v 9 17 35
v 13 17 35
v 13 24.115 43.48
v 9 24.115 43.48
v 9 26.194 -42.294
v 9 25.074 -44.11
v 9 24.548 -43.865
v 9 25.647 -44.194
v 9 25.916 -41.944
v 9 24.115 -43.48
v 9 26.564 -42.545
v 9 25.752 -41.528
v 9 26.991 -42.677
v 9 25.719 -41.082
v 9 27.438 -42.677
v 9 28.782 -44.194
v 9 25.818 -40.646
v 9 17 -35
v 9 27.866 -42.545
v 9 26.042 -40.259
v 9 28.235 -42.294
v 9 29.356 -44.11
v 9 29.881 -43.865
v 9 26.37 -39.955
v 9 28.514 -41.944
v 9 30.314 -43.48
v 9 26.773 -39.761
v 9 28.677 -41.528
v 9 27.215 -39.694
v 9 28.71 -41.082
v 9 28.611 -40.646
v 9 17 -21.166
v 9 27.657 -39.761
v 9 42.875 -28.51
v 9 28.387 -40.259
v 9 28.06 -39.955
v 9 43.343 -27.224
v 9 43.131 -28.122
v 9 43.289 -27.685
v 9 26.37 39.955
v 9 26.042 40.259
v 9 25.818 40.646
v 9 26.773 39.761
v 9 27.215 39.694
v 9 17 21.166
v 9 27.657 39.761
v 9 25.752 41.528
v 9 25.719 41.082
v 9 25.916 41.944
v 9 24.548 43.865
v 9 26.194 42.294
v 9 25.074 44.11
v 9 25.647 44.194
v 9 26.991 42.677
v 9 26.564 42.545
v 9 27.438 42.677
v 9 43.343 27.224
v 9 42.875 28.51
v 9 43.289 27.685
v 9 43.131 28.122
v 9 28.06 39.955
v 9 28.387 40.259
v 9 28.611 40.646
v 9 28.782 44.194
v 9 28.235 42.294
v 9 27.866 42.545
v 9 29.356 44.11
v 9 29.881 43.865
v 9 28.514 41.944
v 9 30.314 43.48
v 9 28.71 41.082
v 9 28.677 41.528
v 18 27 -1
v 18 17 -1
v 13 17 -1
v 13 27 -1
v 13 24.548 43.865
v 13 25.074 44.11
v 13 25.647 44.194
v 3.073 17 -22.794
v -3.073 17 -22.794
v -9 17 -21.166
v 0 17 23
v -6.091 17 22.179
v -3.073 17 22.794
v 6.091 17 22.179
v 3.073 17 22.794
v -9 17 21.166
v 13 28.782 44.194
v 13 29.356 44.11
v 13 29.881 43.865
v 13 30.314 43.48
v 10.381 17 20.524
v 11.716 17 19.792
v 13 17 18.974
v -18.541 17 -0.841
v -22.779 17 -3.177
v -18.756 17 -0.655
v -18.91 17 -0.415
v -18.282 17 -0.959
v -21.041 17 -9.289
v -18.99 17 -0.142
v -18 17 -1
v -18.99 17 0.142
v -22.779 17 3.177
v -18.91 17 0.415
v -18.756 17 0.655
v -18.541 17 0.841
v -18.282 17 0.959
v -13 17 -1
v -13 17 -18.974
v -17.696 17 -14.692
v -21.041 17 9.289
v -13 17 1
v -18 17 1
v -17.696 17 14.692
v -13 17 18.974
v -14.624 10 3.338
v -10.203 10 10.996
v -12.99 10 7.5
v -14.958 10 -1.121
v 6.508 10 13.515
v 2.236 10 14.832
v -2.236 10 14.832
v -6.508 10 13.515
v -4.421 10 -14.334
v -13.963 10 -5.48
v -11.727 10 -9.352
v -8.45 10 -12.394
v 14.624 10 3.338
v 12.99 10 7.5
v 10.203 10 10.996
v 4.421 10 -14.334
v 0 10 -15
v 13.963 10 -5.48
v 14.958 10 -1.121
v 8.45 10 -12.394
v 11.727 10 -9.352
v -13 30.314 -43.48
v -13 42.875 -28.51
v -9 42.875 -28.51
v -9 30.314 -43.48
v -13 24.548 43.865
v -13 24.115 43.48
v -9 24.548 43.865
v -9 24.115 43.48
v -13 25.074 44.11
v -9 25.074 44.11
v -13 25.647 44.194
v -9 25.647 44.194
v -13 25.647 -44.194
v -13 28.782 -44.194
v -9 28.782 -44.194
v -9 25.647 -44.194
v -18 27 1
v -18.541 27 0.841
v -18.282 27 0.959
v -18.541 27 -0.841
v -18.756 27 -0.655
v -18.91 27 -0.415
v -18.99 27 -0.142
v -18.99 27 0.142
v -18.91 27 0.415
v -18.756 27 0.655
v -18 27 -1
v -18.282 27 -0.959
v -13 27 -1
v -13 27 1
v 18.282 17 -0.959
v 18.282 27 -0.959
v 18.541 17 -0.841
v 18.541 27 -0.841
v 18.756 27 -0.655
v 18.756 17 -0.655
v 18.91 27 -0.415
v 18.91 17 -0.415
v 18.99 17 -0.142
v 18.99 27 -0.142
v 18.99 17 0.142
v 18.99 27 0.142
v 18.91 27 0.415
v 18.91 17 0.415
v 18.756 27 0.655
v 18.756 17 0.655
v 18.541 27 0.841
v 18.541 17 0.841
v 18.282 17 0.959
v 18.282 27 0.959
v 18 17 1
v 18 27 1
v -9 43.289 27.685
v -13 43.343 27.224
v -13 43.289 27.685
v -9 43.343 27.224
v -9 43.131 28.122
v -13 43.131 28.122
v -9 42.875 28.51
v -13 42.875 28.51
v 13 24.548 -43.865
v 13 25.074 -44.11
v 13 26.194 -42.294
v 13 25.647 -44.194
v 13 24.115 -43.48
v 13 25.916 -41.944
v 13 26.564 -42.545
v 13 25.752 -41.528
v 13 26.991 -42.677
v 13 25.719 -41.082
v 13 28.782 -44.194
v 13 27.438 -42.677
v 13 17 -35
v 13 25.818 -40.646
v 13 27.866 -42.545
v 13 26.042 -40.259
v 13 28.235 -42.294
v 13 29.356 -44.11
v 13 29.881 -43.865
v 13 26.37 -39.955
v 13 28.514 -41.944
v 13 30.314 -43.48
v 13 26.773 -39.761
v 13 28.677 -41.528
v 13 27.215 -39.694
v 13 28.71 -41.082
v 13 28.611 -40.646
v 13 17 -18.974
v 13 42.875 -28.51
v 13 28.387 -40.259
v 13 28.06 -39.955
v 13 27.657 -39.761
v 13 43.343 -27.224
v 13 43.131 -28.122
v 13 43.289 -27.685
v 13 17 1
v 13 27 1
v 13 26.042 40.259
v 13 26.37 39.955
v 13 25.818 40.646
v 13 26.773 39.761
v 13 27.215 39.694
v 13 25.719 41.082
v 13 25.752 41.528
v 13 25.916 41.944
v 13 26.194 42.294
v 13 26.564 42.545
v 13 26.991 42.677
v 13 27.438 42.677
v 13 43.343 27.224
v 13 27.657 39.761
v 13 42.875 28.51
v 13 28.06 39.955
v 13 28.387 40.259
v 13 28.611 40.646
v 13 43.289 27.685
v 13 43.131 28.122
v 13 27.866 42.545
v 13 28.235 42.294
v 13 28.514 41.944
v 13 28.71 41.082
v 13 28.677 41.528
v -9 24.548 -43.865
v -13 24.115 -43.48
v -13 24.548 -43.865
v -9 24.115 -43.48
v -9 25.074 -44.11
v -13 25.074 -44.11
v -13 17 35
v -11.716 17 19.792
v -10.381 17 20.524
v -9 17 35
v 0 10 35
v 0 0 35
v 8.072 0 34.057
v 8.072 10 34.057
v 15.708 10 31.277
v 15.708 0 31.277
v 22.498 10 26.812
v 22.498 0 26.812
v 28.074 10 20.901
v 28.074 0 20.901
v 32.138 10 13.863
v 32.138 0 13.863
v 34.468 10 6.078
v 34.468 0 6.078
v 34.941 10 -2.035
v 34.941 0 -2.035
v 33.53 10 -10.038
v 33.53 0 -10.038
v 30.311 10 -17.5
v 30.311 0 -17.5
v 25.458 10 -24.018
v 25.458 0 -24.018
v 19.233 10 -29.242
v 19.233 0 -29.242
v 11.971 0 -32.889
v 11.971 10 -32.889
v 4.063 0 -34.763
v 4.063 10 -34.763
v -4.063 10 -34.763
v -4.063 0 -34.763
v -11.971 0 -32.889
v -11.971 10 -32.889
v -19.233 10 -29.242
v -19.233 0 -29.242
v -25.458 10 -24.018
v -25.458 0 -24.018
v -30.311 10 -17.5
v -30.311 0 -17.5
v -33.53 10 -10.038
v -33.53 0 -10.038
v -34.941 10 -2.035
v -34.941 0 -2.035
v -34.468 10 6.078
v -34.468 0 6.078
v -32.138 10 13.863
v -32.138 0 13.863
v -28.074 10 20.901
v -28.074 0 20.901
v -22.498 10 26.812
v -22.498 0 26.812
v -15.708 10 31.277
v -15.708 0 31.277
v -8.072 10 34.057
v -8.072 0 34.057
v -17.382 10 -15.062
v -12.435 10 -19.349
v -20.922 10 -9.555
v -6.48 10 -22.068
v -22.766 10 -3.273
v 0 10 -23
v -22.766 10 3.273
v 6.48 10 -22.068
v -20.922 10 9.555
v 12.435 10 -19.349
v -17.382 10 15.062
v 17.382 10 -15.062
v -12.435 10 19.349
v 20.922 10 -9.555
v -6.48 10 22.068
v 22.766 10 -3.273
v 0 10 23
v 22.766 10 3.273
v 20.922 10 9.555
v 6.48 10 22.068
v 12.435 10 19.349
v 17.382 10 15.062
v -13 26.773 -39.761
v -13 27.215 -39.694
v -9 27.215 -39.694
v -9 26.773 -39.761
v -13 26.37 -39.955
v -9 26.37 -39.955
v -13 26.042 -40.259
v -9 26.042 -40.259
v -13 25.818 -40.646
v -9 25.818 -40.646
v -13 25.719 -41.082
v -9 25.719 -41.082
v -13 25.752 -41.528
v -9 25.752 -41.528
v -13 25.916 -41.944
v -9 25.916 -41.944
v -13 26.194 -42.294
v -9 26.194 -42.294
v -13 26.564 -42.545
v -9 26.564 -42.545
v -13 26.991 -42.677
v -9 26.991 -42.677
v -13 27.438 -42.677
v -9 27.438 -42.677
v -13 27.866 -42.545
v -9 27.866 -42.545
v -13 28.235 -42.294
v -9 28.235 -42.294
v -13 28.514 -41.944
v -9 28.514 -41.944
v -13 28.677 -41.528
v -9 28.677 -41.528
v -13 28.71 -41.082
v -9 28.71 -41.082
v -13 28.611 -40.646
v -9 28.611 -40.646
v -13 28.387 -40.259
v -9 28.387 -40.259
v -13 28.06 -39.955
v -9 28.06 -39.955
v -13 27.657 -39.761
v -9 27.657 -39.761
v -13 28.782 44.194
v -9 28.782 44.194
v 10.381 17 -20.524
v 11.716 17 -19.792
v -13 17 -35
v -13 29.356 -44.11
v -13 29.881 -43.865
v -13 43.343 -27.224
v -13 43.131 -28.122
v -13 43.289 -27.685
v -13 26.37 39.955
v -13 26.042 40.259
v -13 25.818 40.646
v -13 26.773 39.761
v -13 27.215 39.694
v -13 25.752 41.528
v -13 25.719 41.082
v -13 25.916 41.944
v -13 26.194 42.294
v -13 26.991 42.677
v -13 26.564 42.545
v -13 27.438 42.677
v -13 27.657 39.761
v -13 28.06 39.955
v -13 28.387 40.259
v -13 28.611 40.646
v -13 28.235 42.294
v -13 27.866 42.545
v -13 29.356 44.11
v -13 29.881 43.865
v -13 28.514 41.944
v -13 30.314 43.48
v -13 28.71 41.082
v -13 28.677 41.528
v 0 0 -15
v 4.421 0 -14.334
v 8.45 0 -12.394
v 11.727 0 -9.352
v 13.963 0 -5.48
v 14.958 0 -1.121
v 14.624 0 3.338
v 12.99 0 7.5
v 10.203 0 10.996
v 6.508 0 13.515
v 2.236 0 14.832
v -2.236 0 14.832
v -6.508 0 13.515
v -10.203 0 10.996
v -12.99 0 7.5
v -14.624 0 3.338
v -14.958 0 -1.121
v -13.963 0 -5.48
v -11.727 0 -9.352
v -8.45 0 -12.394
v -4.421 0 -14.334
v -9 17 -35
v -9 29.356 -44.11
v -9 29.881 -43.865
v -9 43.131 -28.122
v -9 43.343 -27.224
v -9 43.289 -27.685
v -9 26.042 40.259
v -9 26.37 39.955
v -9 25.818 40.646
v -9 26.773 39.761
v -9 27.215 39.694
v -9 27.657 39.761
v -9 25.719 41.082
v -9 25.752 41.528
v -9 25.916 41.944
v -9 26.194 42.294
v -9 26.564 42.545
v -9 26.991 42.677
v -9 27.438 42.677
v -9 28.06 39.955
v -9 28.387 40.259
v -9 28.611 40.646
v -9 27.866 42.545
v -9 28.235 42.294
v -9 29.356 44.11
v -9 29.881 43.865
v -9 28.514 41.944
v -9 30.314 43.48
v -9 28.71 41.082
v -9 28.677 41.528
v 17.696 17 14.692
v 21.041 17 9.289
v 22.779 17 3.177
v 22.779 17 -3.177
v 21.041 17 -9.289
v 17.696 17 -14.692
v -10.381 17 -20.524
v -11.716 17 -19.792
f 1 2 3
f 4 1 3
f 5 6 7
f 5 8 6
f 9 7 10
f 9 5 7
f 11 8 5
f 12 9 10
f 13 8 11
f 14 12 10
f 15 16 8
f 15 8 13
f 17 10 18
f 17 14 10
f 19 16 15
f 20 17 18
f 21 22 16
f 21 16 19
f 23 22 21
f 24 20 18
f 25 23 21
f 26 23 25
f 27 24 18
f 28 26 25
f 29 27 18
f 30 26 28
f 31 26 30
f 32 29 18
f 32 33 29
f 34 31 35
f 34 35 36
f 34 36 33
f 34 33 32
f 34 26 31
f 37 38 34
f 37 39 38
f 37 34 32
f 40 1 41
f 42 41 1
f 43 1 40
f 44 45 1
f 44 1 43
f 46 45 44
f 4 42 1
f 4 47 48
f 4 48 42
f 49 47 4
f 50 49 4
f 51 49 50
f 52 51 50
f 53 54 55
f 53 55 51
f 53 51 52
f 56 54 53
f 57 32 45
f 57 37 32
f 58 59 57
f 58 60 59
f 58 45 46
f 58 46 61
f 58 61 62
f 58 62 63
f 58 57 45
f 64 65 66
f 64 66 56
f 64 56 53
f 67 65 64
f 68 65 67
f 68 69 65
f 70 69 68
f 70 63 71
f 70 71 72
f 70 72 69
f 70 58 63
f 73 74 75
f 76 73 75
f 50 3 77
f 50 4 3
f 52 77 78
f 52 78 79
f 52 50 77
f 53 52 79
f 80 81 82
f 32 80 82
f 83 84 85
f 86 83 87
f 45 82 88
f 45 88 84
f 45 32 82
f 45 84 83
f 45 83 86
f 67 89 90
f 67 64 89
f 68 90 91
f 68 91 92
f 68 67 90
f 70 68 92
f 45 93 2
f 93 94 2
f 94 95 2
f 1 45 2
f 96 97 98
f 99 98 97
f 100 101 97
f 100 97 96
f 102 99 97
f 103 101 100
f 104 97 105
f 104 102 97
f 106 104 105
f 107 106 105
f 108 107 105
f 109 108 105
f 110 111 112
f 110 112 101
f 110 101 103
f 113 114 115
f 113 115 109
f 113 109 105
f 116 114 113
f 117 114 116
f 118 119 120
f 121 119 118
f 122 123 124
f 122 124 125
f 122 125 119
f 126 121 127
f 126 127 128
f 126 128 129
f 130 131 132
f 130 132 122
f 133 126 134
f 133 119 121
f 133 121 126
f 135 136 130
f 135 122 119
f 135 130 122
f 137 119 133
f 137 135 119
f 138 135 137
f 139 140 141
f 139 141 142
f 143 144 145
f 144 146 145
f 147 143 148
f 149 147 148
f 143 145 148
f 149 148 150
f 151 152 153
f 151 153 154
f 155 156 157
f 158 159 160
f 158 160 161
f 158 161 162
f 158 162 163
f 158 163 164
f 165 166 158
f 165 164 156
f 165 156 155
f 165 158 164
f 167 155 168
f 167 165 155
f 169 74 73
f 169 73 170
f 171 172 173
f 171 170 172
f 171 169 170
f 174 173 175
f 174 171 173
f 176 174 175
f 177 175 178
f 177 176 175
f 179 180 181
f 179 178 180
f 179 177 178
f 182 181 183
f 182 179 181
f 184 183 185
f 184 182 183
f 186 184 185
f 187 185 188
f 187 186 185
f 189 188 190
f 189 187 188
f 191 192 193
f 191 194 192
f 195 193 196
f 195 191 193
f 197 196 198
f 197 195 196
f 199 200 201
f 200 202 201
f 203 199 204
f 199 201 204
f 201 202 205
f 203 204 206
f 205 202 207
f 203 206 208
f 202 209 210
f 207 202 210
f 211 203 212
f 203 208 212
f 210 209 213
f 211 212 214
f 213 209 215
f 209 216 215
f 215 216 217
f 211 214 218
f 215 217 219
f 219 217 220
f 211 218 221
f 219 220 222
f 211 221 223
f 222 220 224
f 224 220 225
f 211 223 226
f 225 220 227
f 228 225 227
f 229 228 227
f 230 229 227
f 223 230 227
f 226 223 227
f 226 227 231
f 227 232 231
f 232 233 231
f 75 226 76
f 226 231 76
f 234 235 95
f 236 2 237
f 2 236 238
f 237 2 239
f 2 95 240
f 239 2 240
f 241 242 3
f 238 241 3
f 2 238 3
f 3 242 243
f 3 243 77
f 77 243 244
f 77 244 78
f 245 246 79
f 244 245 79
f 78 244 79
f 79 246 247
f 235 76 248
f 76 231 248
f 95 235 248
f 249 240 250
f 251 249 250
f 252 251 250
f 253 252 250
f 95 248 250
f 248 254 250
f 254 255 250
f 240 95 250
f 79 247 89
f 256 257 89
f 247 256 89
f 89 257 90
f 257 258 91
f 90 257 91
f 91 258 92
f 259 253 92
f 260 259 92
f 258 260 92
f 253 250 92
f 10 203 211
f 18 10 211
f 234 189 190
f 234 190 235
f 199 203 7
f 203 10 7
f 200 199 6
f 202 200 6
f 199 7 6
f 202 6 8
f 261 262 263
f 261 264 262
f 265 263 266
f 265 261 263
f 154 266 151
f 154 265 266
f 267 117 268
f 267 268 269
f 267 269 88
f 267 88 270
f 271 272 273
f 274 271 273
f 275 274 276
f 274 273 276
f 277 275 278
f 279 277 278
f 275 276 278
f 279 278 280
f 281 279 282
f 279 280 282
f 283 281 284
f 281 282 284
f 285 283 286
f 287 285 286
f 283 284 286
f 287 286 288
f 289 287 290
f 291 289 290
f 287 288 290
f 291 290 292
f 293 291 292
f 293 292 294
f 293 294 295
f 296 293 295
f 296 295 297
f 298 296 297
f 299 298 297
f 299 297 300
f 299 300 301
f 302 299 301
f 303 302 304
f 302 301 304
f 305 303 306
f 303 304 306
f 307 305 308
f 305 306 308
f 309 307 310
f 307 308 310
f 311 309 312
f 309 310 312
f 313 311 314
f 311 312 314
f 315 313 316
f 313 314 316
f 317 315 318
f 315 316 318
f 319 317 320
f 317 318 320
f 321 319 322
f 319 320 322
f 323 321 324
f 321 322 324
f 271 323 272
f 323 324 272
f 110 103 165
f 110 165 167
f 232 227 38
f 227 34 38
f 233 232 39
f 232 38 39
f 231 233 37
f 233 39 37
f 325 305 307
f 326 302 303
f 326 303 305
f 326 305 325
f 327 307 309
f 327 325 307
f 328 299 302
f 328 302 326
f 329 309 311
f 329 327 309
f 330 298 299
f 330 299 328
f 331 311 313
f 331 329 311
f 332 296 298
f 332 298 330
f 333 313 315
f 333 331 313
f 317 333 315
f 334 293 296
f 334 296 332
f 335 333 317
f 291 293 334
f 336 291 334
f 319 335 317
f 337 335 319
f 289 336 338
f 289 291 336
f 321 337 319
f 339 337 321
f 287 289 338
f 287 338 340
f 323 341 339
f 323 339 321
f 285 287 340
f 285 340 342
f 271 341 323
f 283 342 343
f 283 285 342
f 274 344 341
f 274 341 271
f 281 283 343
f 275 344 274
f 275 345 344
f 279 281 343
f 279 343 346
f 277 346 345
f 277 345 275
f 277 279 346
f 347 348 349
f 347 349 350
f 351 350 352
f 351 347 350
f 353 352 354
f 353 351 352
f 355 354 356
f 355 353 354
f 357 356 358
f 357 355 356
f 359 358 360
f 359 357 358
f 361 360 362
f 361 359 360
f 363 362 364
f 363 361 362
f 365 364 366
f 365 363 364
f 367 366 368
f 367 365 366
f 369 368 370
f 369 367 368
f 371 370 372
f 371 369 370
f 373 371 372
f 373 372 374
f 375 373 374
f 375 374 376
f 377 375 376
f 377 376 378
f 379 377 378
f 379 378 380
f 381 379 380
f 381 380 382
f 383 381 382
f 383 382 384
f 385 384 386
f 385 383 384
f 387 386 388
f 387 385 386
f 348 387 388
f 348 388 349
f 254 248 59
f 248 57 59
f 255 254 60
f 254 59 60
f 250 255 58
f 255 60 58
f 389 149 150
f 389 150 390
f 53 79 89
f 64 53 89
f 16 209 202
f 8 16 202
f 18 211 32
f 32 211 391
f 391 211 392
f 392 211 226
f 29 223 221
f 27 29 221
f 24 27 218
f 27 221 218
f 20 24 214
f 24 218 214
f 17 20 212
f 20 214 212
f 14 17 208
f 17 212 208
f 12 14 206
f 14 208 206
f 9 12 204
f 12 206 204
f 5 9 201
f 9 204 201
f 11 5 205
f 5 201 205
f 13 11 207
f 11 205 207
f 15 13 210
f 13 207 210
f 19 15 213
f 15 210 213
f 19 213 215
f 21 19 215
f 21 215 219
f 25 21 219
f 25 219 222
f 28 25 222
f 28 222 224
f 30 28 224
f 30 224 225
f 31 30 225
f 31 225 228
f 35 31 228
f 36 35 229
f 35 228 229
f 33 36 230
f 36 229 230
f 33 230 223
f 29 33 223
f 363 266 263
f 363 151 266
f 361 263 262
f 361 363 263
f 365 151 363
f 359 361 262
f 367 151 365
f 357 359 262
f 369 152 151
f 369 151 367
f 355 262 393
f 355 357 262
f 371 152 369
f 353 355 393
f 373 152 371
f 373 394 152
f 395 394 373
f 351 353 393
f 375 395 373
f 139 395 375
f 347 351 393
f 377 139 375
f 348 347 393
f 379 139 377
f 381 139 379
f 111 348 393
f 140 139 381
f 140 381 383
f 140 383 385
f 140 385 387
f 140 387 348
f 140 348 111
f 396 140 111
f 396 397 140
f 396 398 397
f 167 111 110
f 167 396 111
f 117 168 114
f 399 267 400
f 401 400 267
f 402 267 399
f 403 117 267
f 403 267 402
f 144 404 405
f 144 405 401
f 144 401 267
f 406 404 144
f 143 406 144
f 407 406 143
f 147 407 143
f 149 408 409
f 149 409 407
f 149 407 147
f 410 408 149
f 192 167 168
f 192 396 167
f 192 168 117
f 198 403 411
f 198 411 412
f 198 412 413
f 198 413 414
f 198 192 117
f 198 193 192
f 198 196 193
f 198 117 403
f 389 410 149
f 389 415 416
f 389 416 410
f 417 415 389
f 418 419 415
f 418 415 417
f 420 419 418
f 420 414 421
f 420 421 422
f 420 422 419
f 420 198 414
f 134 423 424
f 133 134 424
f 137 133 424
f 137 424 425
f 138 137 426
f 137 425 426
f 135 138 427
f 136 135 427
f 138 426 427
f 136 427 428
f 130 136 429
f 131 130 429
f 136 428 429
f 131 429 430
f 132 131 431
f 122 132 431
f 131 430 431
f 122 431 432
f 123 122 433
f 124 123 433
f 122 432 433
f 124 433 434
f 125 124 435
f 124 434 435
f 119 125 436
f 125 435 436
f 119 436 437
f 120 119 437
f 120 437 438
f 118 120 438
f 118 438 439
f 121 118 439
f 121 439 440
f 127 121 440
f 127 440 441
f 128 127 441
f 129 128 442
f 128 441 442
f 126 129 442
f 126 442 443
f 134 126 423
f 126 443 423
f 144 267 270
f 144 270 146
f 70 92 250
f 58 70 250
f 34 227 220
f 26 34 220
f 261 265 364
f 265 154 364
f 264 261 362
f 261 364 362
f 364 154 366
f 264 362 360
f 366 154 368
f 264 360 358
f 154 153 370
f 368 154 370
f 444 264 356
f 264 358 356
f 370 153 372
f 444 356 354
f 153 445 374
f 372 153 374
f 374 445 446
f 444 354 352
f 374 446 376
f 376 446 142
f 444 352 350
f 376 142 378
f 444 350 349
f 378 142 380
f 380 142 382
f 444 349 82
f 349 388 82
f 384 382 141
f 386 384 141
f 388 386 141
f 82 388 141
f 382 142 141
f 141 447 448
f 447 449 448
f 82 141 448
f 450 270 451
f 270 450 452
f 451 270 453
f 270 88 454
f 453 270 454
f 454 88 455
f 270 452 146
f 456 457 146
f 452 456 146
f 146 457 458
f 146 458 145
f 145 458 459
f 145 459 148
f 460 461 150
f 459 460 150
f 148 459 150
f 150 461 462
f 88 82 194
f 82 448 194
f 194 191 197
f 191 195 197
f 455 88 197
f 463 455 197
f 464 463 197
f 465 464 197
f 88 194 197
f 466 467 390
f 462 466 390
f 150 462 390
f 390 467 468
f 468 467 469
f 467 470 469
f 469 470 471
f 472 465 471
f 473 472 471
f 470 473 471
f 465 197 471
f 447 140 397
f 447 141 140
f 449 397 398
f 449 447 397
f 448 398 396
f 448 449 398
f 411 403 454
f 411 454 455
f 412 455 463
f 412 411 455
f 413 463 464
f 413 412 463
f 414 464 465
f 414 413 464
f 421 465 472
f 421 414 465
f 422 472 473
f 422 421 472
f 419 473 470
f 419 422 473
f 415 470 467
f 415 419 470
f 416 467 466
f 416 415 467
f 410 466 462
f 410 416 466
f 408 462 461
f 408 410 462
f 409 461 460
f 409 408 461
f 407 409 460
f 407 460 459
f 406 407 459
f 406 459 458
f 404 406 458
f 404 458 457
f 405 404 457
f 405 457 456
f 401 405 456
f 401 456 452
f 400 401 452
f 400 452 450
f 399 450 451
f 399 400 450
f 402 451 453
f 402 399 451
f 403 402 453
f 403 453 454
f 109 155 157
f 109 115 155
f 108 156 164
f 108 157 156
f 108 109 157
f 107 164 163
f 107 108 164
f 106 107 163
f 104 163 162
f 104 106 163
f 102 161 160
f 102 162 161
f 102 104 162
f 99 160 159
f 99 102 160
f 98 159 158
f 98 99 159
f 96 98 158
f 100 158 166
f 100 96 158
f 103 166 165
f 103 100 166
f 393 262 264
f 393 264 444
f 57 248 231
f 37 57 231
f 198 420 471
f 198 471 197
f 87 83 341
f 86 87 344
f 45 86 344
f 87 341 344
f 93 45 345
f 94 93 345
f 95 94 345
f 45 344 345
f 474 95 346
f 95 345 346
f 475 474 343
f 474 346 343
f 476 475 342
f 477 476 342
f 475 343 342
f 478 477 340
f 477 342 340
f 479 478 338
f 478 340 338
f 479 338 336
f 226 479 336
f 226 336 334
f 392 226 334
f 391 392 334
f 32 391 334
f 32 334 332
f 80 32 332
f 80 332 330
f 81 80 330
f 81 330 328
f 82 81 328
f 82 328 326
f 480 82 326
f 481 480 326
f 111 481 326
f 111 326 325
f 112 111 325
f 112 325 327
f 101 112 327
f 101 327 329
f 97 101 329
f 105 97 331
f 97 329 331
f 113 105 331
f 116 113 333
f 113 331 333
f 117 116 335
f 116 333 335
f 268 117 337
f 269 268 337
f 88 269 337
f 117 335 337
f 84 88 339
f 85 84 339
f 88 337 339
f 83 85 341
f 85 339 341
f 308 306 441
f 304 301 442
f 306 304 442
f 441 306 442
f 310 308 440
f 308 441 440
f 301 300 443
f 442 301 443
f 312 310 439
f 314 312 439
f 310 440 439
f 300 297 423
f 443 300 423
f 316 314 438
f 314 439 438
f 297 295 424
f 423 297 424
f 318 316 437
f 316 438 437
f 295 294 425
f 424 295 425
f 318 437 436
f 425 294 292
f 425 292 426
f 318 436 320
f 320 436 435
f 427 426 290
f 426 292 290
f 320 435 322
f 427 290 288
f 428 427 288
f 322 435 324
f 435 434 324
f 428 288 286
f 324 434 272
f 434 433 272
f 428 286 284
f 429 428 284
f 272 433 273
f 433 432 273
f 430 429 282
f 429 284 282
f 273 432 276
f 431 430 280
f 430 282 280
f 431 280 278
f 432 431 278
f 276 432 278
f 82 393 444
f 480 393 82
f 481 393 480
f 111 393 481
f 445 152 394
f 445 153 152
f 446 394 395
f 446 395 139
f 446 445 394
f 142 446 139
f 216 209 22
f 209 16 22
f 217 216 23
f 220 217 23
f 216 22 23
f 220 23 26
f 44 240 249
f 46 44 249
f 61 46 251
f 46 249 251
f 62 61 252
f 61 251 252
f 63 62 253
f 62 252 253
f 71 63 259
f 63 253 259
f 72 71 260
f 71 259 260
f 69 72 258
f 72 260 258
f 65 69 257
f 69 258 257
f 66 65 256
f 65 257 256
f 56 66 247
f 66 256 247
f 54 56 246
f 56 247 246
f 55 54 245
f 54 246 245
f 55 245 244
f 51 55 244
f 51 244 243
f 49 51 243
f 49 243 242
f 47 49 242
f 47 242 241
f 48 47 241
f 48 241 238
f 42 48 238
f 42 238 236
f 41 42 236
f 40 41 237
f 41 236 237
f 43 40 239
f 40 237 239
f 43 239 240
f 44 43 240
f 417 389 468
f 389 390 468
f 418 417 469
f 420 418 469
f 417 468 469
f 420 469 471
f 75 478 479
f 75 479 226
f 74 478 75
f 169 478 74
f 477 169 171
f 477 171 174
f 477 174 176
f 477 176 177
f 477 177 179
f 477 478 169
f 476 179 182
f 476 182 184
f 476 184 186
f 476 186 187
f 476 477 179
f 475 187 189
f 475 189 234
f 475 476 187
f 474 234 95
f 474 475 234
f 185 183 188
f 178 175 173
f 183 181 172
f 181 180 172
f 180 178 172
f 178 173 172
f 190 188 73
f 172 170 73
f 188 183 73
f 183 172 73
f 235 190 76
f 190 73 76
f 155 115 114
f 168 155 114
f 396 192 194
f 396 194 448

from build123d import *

# Parameters (mm, degrees)
SKETCH1_R                   = 35
BOSS_EXTRUDE1_DEPTH         = 10
SKETCH2_R                   = 23
BOSS_EXTRUDE2_DEPTH         = 7
BOSS_EXTRUDE3_DEPTH         = 4
SKETCH5_R                   = 1.5
CUT_EXTRUDE1_DEPTH          = 4
FILLET1_R                   = 2
FILLET1_OF_MIRROR1_R        = 2
SKETCH6_W                   = 6
SKETCH6_H                   = 2
BOSS_EXTRUDE4_DEPTH         = 10
FILLET2_RADIUS              = 1
FILLET2_LENGTH              = 10
FILLET2_OF_MIRROR2_2_RADIUS = 1
FILLET2_OF_MIRROR2_2_LENGTH = 10
SKETCH7_R                   = 15
CUT_EXTRUDE2_DEPTH          = 10


with BuildPart() as part:
    # Sketch1 → Boss-Extrude1 (new body)
    with BuildSketch(Plane(origin=(0, 0, 0), x_dir=(1, 0, 0), z_dir=(0, 1, 0))):
        with Locations(Location((0, 0, 0), (0, 0, 270))):
            Circle(SKETCH1_R)
    extrude(amount=BOSS_EXTRUDE1_DEPTH)

    # Sketch2 → Boss-Extrude2 (add)
    with BuildSketch(Plane(origin=(0, 10, 0), x_dir=(1, 0, 0), z_dir=(0, 1, 0))):
        with Locations(Location((0, 0, 0), (0, 0, 270))):
            Circle(SKETCH2_R)
    extrude(amount=BOSS_EXTRUDE2_DEPTH)

    # Sketch4 → Boss-Extrude3 (add)
    with BuildSketch(Plane(origin=(13, 0, 0), x_dir=(0, 0, -1), z_dir=(1, 0, 0))):
        Polygon((35, 17), (-35, 17), (-44.194, 24.714682009), (-44.194, 29.714682009), (-27.952, 43.343338219), (27.952, 43.343338219), (44.194, 29.714682009), (44.194, 24.714682009), align=None)
    boss_extrude3 = extrude(amount=-BOSS_EXTRUDE3_DEPTH)

    # Sketch5 → Cut-Extrude1 (cut)
    with BuildSketch(Plane(origin=(13, 0, 0), x_dir=(0, 0, -1), z_dir=(1, 0, 0))):
        with Locations((-41.194, 27.214682009)):
            Circle(SKETCH5_R)
        with Locations(Location((41.194, 27.214682009, 0), (0, 0, 180))):
            Circle(SKETCH5_R)
    cut_extrude1 = extrude(amount=-CUT_EXTRUDE1_DEPTH, mode=Mode.SUBTRACT)

    # Fillet1
    fillet1_edges = [part.edges().sort_by_distance(p)[0] for p in [
        (11, 43.343338219, 27.952),
        (11, 43.343338219, -27.952),
        (11, 29.714682009, -44.194),
        (11, 24.714682009, -44.194),
        (11, 24.714682009, 44.194),
        (11, 29.714682009, 44.194),
    ]]
    fillet(fillet1_edges, radius=FILLET1_R)

    # Mirror1: Boss-Extrude3, Cut-Extrude1 across plane
    add(boss_extrude3.mirror(Plane(origin=(0, 0, 0), x_dir=(0, 0, 1), z_dir=(1, 0, 0))))
    add(cut_extrude1.mirror(Plane(origin=(0, 0, 0), x_dir=(0, 0, 1), z_dir=(1, 0, 0))), mode=Mode.SUBTRACT)

    # Fillet1 of Mirror1
    fillet1_of_mirror1_edges = [part.edges().sort_by_distance(p)[0] for p in [
        (-11, 43.343338219, 27.952),
        (-11, 43.343338219, -27.952),
        (-11, 29.714682009, -44.194),
        (-11, 24.714682009, -44.194),
        (-11, 24.714682009, 44.194),
        (-11, 29.714682009, 44.194),
    ]]
    fillet(fillet1_of_mirror1_edges, radius=FILLET1_OF_MIRROR1_R)

    # Sketch6 → Boss-Extrude4 (add)
    with BuildSketch(Plane(origin=(0, 17, 0), x_dir=(1, 0, 0), z_dir=(0, 1, 0))):
        with Locations((-16, 0)):
            Rectangle(SKETCH6_W, SKETCH6_H)
    boss_extrude4 = extrude(amount=BOSS_EXTRUDE4_DEPTH)

    # Fillet2: full round fillet: the end face becomes a half cylinder, R = half its width
    fillet2_face = Plane((-19, 22, 0), x_dir=(0, -1, 0), z_dir=(-1, 0, 0))  # on the end face: x along it, z out of the body
    fillet2_slab = fillet2_face.offset(-FILLET2_RADIUS / 2) * Box(FILLET2_LENGTH, 2 * FILLET2_RADIUS, FILLET2_RADIUS, mode=Mode.PRIVATE)  # the body's end, R deep
    fillet2_round = Plane((-18, 22, 0), x_dir=(-1, 0, 0), z_dir=(0, -1, 0)) * Cylinder(FILLET2_RADIUS, FILLET2_LENGTH, mode=Mode.PRIVATE)  # its axis R under the face
    add(fillet2_slab - fillet2_round, mode=Mode.SUBTRACT)

    # Mirror2: Boss-Extrude4 across plane
    add(boss_extrude4.mirror(Plane(origin=(0, 0, 0), x_dir=(0, 0, 1), z_dir=(1, 0, 0))))

    # Fillet2 of Mirror2 2: full round fillet: the end face becomes a half cylinder, R = half its width
    fillet2_of_mirror2_2_face = Plane((19, 22, 0), x_dir=(0, -1, 0), z_dir=(1, 0, 0))  # on the end face: x along it, z out of the body
    fillet2_of_mirror2_2_slab = fillet2_of_mirror2_2_face.offset(-FILLET2_OF_MIRROR2_2_RADIUS / 2) * Box(FILLET2_OF_MIRROR2_2_LENGTH, 2 * FILLET2_OF_MIRROR2_2_RADIUS, FILLET2_OF_MIRROR2_2_RADIUS, mode=Mode.PRIVATE)  # the body's end, R deep
    fillet2_of_mirror2_2_round = Plane((18, 22, 0), x_dir=(1, 0, 0), z_dir=(0, -1, 0)) * Cylinder(FILLET2_OF_MIRROR2_2_RADIUS, FILLET2_OF_MIRROR2_2_LENGTH, mode=Mode.PRIVATE)  # its axis R under the face
    add(fillet2_of_mirror2_2_slab - fillet2_of_mirror2_2_round, mode=Mode.SUBTRACT)

    # Sketch7 → Cut-Extrude2 (cut)
    with BuildSketch(Plane.XZ):
        with Locations(Location((0, 0, 0), (0, 0, 270))):
            Circle(SKETCH7_R)
    extrude(amount=-CUT_EXTRUDE2_DEPTH, mode=Mode.SUBTRACT)


solid = part.part
